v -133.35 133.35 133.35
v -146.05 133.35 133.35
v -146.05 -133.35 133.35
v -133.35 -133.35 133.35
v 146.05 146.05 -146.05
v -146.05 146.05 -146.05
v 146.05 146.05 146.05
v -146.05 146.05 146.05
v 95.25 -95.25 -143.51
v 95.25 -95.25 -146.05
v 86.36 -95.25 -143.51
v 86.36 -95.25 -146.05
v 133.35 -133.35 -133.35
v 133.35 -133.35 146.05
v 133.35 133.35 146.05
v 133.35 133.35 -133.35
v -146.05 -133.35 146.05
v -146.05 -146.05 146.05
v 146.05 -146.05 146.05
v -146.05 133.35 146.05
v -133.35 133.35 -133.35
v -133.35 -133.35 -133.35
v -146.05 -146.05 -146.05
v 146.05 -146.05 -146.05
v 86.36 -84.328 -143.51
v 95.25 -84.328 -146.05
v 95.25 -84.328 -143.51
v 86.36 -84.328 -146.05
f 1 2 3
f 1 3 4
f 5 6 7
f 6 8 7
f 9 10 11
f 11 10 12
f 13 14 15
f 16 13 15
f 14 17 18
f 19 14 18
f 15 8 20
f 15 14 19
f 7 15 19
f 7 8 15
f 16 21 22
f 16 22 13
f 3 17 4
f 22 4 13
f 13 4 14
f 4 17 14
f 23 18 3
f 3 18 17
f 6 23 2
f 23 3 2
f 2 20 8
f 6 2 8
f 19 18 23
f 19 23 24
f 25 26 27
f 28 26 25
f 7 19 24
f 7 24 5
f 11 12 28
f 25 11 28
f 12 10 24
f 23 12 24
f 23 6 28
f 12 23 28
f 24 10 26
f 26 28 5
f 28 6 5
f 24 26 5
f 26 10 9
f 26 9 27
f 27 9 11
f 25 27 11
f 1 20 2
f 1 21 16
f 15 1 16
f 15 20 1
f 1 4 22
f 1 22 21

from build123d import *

# Parameters (mm, degrees)
SKETCH2_W           = 292.1
SKETCH2_H           = 292.1
BOSS_EXTRUDE1_DEPTH = 146.05
SHELL1_T            = -12.7
SKETCH3_W           = 44.121317042
SKETCH3_H           = 266.7
CUT_EXTRUDE1_DEPTH  = 12.7
SKETCH4_W           = 8.89
SKETCH4_H           = 10.922
CUT_EXTRUDE2_DEPTH  = 2.54


with BuildPart() as part:
    # Sketch2 → Boss-Extrude1 (new body, symmetric)
    with BuildSketch(Plane.XY):
        Rectangle(SKETCH2_W, SKETCH2_H)
    extrude(amount=BOSS_EXTRUDE1_DEPTH, both=True)

    # Shell1
    shell1_openings = [part.faces().sort_by_distance(p)[0] for p in [
        (0, 0, 146.05),
    ]]
    offset(amount=SHELL1_T, openings=shell1_openings, kind=Kind.INTERSECTION)

    # Sketch3 → Cut-Extrude1 (cut)
    with BuildSketch(Plane.XY.offset(146.05)):
        with Locations((-133.35, 0)):
            Rectangle(SKETCH3_W, SKETCH3_H)
    extrude(amount=-CUT_EXTRUDE1_DEPTH, mode=Mode.SUBTRACT)

    # Sketch4 → Cut-Extrude2 (cut)
    with BuildSketch(Plane(origin=(0, 0, -146.05), x_dir=(-1, 0, 0), z_dir=(0, 0, -1))):
        with Locations((-90.805, -89.789)):
            Rectangle(SKETCH4_W, SKETCH4_H)
    extrude(amount=-CUT_EXTRUDE2_DEPTH, mode=Mode.SUBTRACT)


solid = part.part
